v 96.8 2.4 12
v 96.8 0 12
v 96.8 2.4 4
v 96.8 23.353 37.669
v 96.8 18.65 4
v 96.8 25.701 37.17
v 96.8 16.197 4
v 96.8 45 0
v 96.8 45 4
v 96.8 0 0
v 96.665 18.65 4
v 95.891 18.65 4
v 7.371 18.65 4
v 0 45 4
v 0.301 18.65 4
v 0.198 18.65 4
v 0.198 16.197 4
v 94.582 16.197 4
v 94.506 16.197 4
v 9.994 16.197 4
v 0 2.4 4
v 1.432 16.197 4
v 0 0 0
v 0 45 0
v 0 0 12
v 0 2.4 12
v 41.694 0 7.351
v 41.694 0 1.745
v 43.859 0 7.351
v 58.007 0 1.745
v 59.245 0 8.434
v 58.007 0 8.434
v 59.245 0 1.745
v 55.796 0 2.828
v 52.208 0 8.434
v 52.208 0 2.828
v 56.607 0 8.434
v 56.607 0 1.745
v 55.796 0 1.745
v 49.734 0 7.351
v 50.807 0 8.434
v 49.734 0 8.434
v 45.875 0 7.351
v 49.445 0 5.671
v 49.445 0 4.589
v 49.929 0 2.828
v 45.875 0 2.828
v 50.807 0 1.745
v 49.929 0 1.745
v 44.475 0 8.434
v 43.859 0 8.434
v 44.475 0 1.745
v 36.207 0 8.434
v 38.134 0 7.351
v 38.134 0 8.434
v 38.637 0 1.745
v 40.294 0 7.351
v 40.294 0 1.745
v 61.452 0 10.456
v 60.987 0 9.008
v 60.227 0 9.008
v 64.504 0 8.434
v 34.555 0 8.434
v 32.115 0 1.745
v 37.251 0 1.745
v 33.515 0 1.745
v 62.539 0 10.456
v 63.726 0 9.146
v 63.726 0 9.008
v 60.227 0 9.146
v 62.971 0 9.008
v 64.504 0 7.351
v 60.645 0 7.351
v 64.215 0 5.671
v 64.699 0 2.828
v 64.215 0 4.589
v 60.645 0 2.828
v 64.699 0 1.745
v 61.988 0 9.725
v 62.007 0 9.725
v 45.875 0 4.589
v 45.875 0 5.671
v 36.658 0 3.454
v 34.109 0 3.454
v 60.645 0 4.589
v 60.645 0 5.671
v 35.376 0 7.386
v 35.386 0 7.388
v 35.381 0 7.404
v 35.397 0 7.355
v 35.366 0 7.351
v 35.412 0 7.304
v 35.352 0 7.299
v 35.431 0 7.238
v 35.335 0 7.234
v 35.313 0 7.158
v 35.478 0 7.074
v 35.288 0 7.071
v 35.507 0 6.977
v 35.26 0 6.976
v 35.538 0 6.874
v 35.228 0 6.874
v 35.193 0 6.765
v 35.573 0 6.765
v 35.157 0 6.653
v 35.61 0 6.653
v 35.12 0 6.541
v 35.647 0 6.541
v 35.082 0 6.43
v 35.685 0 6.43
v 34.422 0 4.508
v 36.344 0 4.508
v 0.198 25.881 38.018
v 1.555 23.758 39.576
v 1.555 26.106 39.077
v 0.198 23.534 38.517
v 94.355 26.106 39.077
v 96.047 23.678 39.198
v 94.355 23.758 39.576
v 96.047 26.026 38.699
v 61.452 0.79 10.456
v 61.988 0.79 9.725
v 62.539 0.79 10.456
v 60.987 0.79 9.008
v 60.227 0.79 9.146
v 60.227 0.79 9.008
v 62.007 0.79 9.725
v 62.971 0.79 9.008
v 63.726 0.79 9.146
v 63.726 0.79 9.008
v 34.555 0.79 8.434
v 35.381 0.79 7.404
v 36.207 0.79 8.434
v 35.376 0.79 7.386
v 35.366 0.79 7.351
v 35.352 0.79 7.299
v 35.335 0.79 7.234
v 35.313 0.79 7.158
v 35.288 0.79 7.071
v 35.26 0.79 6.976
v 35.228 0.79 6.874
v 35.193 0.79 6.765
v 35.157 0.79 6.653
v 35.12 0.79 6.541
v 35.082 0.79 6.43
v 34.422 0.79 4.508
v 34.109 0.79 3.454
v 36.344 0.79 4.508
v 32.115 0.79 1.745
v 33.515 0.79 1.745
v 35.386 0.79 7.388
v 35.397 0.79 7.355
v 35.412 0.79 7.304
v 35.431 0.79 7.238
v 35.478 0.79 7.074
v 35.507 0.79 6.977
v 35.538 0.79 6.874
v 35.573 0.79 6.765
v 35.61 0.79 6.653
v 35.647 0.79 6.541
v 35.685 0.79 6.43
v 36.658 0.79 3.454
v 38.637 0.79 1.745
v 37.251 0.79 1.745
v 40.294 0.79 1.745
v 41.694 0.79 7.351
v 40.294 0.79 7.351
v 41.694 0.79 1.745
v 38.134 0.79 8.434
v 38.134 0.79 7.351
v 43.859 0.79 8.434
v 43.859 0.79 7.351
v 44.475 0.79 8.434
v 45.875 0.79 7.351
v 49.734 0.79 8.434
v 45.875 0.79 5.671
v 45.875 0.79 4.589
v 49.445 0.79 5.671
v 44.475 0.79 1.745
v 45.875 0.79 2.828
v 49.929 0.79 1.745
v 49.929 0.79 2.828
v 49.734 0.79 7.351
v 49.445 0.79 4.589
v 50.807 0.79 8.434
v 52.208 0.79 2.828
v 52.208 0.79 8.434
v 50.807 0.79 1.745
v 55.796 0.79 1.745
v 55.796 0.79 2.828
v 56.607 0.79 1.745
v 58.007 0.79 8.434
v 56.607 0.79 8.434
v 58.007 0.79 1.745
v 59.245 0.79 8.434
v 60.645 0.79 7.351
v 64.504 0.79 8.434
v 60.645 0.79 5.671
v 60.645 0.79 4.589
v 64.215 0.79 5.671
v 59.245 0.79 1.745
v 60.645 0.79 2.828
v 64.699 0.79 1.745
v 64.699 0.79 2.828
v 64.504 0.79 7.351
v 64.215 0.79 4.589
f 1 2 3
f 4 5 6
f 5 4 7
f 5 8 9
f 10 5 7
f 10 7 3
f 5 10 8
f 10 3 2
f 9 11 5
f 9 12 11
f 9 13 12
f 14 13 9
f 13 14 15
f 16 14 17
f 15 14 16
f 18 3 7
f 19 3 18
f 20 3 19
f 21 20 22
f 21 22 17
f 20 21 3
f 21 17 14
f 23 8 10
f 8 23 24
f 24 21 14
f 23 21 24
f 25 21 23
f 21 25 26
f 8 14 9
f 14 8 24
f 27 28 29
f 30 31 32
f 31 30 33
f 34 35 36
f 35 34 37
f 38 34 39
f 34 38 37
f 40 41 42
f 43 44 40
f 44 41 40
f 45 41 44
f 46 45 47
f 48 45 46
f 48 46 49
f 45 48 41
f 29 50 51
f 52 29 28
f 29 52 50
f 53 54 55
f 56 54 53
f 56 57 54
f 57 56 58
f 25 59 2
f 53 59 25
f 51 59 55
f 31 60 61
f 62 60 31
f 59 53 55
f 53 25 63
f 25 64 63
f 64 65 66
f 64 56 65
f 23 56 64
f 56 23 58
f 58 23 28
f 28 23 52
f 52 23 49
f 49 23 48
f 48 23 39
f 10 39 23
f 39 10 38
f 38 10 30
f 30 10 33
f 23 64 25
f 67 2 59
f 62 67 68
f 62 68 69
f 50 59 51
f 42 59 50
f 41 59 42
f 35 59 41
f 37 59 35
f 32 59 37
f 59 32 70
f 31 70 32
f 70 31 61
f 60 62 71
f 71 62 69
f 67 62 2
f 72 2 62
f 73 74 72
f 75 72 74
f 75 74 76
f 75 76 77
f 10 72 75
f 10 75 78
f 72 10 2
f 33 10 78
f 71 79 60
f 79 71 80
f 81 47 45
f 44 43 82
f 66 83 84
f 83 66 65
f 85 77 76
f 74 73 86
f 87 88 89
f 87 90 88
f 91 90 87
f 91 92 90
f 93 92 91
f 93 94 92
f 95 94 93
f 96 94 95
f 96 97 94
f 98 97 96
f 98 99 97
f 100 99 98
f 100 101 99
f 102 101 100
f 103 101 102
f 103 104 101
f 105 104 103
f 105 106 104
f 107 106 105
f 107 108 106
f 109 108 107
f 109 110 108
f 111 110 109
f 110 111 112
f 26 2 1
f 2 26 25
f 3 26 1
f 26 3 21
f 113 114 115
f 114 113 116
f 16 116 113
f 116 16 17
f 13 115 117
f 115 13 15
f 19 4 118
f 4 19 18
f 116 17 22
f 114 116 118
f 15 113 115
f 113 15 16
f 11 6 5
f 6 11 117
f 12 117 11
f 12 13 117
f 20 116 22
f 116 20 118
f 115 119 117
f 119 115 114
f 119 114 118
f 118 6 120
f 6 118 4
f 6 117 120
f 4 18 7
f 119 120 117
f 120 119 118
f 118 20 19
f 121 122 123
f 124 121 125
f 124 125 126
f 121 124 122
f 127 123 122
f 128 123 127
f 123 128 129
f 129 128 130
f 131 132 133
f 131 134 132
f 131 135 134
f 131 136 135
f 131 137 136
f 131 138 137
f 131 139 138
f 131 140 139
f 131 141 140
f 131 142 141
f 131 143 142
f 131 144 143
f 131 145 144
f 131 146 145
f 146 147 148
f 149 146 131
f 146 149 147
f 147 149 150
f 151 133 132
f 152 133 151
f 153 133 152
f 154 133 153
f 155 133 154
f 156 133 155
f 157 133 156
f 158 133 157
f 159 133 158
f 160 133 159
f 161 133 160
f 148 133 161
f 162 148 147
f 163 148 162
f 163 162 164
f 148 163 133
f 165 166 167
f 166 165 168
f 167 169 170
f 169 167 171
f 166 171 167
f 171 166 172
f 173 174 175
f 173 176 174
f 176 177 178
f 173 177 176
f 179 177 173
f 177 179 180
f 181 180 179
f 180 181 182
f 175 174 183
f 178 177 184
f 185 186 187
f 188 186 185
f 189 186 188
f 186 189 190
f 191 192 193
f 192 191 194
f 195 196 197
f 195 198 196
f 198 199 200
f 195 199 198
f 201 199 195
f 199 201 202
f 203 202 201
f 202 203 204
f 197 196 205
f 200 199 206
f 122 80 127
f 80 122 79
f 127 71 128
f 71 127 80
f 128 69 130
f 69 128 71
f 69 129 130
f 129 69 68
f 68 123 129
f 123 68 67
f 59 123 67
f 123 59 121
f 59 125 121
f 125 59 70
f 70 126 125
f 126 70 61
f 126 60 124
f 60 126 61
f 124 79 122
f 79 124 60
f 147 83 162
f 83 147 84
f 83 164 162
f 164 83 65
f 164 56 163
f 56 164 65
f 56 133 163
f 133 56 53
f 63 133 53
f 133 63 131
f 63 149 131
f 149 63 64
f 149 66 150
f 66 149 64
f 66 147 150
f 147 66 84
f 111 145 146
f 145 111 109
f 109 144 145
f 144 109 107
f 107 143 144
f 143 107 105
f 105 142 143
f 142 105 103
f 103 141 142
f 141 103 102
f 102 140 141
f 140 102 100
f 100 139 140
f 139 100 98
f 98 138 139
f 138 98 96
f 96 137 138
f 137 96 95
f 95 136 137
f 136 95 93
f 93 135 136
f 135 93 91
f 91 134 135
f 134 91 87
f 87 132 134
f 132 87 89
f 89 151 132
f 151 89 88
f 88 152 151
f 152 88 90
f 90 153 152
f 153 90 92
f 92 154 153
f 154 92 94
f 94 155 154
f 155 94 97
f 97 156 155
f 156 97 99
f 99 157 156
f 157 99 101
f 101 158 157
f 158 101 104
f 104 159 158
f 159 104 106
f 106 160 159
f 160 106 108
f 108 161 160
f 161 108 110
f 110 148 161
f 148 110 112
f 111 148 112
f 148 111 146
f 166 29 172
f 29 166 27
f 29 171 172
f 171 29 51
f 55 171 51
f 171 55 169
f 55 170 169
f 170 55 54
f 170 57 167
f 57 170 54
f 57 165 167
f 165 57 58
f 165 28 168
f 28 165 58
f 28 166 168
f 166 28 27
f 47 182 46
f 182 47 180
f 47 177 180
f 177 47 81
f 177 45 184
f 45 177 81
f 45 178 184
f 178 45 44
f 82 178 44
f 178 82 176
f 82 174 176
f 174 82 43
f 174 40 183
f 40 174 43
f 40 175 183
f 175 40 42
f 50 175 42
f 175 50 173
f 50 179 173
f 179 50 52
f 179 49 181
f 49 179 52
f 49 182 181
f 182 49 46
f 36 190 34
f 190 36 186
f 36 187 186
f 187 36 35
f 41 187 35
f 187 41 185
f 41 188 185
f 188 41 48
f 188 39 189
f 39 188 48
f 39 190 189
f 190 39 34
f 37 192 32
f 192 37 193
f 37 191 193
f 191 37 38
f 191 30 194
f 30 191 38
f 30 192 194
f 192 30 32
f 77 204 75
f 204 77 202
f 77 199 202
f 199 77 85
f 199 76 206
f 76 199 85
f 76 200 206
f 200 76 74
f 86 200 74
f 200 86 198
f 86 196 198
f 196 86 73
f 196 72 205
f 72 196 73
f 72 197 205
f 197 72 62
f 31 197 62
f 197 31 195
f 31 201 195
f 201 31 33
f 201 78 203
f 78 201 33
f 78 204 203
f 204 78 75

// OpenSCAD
module rounded_plate(size, radius) {
    r = min(radius, size[0] / 2, size[2] / 2);

    translate([0, size[1], 0])
        rotate([90, 0, 0])
            linear_extrude(height = size[1])
                hull() {
                    translate([r, r])
                        circle(r = r);
                    translate([size[0] - r, r])
                        circle(r = r);
                    translate([r, size[2] - r])
                        circle(r = r);
                    translate([size[0] - r, size[2] - r])
                        circle(r = r);
                }
}

// Porta-cartão de mesa - impressão 3D
card_w = 90;         // largura do cartão (mm)
card_h = 50;         // altura do cartão (mm)
stack = 12;          // espessura da pilha de cartões (mm)
wall = 2.4;          // espessura das paredes (mm)
clearance = 1;       // folga para os cartões (mm)
tilt = 12;           // inclinação do encosto (graus)
base_d = 45;         // profundidade da base (mm)
base_h = 4;          // altura da base (mm)
lip_h = 12;          // altura da aba da frente (mm)
back_h = 40;         // altura do encosto (mm)
word = "ATELIÊ";     // texto gravado
font_size = 7;       // altura da letra (mm)
engrave = 0.8;       // profundidade da gravação (mm)

body_w = card_w + 2 * clearance + 2 * wall;
pocket = stack + clearance;

difference() {
    union() {
        cube([body_w, base_d, base_h]);
        cube([body_w, wall, lip_h]);
        translate([0, wall + pocket + wall, 0])
            rotate([-tilt, 0, 0])
                translate([0, -wall, 0])
                    rounded_plate([body_w, wall, back_h], 2);
    }
    translate([body_w / 2, -0.01, lip_h / 2])
        rotate([90, 0, 0])
            translate([0, 0, -engrave])
                linear_extrude(engrave + 0.01)
                    text(word, size = font_size, font = "Liberation Sans:style=Bold",
                         halign = "center", valign = "center");
}

echo(str("Largura: ", body_w, " mm"));
echo(str("Profundidade: ", base_d, " mm"));
echo(str("Altura: ", back_h * cos(tilt), " mm"));
